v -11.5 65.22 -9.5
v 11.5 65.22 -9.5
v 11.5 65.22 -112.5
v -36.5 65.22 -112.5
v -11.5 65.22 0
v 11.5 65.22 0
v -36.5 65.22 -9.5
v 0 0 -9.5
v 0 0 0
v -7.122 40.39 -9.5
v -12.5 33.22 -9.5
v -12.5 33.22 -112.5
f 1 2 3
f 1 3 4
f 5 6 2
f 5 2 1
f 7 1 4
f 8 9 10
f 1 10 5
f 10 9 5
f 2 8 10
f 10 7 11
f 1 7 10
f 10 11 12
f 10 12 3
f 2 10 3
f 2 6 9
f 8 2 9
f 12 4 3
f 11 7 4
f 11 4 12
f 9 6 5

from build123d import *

# Parameters (mm, degrees)
BOSS_EXTRUDE1_DEPTH = 9.5
BOSS_EXTRUDE2_DEPTH = 103


with BuildPart() as part:
    # Sketch1 → Boss-Extrude1 (new body)
    with BuildSketch(Plane.XY):
        Polygon((0, 0), (-11.5, 65.219740926), (11.5, 65.219740926), align=None)
    extrude(amount=-BOSS_EXTRUDE1_DEPTH)

    # Sketch2 → Boss-Extrude2 (add)
    with BuildSketch(Plane(origin=(0, 0, -9.5), x_dir=(-1, 0, 0), z_dir=(0, 0, -1))):
        Polygon((-11.5, 65.219740926), (36.5, 65.219740926), (12.5, 33.219740926), align=None)
    extrude(amount=BOSS_EXTRUDE2_DEPTH)


solid = part.part
